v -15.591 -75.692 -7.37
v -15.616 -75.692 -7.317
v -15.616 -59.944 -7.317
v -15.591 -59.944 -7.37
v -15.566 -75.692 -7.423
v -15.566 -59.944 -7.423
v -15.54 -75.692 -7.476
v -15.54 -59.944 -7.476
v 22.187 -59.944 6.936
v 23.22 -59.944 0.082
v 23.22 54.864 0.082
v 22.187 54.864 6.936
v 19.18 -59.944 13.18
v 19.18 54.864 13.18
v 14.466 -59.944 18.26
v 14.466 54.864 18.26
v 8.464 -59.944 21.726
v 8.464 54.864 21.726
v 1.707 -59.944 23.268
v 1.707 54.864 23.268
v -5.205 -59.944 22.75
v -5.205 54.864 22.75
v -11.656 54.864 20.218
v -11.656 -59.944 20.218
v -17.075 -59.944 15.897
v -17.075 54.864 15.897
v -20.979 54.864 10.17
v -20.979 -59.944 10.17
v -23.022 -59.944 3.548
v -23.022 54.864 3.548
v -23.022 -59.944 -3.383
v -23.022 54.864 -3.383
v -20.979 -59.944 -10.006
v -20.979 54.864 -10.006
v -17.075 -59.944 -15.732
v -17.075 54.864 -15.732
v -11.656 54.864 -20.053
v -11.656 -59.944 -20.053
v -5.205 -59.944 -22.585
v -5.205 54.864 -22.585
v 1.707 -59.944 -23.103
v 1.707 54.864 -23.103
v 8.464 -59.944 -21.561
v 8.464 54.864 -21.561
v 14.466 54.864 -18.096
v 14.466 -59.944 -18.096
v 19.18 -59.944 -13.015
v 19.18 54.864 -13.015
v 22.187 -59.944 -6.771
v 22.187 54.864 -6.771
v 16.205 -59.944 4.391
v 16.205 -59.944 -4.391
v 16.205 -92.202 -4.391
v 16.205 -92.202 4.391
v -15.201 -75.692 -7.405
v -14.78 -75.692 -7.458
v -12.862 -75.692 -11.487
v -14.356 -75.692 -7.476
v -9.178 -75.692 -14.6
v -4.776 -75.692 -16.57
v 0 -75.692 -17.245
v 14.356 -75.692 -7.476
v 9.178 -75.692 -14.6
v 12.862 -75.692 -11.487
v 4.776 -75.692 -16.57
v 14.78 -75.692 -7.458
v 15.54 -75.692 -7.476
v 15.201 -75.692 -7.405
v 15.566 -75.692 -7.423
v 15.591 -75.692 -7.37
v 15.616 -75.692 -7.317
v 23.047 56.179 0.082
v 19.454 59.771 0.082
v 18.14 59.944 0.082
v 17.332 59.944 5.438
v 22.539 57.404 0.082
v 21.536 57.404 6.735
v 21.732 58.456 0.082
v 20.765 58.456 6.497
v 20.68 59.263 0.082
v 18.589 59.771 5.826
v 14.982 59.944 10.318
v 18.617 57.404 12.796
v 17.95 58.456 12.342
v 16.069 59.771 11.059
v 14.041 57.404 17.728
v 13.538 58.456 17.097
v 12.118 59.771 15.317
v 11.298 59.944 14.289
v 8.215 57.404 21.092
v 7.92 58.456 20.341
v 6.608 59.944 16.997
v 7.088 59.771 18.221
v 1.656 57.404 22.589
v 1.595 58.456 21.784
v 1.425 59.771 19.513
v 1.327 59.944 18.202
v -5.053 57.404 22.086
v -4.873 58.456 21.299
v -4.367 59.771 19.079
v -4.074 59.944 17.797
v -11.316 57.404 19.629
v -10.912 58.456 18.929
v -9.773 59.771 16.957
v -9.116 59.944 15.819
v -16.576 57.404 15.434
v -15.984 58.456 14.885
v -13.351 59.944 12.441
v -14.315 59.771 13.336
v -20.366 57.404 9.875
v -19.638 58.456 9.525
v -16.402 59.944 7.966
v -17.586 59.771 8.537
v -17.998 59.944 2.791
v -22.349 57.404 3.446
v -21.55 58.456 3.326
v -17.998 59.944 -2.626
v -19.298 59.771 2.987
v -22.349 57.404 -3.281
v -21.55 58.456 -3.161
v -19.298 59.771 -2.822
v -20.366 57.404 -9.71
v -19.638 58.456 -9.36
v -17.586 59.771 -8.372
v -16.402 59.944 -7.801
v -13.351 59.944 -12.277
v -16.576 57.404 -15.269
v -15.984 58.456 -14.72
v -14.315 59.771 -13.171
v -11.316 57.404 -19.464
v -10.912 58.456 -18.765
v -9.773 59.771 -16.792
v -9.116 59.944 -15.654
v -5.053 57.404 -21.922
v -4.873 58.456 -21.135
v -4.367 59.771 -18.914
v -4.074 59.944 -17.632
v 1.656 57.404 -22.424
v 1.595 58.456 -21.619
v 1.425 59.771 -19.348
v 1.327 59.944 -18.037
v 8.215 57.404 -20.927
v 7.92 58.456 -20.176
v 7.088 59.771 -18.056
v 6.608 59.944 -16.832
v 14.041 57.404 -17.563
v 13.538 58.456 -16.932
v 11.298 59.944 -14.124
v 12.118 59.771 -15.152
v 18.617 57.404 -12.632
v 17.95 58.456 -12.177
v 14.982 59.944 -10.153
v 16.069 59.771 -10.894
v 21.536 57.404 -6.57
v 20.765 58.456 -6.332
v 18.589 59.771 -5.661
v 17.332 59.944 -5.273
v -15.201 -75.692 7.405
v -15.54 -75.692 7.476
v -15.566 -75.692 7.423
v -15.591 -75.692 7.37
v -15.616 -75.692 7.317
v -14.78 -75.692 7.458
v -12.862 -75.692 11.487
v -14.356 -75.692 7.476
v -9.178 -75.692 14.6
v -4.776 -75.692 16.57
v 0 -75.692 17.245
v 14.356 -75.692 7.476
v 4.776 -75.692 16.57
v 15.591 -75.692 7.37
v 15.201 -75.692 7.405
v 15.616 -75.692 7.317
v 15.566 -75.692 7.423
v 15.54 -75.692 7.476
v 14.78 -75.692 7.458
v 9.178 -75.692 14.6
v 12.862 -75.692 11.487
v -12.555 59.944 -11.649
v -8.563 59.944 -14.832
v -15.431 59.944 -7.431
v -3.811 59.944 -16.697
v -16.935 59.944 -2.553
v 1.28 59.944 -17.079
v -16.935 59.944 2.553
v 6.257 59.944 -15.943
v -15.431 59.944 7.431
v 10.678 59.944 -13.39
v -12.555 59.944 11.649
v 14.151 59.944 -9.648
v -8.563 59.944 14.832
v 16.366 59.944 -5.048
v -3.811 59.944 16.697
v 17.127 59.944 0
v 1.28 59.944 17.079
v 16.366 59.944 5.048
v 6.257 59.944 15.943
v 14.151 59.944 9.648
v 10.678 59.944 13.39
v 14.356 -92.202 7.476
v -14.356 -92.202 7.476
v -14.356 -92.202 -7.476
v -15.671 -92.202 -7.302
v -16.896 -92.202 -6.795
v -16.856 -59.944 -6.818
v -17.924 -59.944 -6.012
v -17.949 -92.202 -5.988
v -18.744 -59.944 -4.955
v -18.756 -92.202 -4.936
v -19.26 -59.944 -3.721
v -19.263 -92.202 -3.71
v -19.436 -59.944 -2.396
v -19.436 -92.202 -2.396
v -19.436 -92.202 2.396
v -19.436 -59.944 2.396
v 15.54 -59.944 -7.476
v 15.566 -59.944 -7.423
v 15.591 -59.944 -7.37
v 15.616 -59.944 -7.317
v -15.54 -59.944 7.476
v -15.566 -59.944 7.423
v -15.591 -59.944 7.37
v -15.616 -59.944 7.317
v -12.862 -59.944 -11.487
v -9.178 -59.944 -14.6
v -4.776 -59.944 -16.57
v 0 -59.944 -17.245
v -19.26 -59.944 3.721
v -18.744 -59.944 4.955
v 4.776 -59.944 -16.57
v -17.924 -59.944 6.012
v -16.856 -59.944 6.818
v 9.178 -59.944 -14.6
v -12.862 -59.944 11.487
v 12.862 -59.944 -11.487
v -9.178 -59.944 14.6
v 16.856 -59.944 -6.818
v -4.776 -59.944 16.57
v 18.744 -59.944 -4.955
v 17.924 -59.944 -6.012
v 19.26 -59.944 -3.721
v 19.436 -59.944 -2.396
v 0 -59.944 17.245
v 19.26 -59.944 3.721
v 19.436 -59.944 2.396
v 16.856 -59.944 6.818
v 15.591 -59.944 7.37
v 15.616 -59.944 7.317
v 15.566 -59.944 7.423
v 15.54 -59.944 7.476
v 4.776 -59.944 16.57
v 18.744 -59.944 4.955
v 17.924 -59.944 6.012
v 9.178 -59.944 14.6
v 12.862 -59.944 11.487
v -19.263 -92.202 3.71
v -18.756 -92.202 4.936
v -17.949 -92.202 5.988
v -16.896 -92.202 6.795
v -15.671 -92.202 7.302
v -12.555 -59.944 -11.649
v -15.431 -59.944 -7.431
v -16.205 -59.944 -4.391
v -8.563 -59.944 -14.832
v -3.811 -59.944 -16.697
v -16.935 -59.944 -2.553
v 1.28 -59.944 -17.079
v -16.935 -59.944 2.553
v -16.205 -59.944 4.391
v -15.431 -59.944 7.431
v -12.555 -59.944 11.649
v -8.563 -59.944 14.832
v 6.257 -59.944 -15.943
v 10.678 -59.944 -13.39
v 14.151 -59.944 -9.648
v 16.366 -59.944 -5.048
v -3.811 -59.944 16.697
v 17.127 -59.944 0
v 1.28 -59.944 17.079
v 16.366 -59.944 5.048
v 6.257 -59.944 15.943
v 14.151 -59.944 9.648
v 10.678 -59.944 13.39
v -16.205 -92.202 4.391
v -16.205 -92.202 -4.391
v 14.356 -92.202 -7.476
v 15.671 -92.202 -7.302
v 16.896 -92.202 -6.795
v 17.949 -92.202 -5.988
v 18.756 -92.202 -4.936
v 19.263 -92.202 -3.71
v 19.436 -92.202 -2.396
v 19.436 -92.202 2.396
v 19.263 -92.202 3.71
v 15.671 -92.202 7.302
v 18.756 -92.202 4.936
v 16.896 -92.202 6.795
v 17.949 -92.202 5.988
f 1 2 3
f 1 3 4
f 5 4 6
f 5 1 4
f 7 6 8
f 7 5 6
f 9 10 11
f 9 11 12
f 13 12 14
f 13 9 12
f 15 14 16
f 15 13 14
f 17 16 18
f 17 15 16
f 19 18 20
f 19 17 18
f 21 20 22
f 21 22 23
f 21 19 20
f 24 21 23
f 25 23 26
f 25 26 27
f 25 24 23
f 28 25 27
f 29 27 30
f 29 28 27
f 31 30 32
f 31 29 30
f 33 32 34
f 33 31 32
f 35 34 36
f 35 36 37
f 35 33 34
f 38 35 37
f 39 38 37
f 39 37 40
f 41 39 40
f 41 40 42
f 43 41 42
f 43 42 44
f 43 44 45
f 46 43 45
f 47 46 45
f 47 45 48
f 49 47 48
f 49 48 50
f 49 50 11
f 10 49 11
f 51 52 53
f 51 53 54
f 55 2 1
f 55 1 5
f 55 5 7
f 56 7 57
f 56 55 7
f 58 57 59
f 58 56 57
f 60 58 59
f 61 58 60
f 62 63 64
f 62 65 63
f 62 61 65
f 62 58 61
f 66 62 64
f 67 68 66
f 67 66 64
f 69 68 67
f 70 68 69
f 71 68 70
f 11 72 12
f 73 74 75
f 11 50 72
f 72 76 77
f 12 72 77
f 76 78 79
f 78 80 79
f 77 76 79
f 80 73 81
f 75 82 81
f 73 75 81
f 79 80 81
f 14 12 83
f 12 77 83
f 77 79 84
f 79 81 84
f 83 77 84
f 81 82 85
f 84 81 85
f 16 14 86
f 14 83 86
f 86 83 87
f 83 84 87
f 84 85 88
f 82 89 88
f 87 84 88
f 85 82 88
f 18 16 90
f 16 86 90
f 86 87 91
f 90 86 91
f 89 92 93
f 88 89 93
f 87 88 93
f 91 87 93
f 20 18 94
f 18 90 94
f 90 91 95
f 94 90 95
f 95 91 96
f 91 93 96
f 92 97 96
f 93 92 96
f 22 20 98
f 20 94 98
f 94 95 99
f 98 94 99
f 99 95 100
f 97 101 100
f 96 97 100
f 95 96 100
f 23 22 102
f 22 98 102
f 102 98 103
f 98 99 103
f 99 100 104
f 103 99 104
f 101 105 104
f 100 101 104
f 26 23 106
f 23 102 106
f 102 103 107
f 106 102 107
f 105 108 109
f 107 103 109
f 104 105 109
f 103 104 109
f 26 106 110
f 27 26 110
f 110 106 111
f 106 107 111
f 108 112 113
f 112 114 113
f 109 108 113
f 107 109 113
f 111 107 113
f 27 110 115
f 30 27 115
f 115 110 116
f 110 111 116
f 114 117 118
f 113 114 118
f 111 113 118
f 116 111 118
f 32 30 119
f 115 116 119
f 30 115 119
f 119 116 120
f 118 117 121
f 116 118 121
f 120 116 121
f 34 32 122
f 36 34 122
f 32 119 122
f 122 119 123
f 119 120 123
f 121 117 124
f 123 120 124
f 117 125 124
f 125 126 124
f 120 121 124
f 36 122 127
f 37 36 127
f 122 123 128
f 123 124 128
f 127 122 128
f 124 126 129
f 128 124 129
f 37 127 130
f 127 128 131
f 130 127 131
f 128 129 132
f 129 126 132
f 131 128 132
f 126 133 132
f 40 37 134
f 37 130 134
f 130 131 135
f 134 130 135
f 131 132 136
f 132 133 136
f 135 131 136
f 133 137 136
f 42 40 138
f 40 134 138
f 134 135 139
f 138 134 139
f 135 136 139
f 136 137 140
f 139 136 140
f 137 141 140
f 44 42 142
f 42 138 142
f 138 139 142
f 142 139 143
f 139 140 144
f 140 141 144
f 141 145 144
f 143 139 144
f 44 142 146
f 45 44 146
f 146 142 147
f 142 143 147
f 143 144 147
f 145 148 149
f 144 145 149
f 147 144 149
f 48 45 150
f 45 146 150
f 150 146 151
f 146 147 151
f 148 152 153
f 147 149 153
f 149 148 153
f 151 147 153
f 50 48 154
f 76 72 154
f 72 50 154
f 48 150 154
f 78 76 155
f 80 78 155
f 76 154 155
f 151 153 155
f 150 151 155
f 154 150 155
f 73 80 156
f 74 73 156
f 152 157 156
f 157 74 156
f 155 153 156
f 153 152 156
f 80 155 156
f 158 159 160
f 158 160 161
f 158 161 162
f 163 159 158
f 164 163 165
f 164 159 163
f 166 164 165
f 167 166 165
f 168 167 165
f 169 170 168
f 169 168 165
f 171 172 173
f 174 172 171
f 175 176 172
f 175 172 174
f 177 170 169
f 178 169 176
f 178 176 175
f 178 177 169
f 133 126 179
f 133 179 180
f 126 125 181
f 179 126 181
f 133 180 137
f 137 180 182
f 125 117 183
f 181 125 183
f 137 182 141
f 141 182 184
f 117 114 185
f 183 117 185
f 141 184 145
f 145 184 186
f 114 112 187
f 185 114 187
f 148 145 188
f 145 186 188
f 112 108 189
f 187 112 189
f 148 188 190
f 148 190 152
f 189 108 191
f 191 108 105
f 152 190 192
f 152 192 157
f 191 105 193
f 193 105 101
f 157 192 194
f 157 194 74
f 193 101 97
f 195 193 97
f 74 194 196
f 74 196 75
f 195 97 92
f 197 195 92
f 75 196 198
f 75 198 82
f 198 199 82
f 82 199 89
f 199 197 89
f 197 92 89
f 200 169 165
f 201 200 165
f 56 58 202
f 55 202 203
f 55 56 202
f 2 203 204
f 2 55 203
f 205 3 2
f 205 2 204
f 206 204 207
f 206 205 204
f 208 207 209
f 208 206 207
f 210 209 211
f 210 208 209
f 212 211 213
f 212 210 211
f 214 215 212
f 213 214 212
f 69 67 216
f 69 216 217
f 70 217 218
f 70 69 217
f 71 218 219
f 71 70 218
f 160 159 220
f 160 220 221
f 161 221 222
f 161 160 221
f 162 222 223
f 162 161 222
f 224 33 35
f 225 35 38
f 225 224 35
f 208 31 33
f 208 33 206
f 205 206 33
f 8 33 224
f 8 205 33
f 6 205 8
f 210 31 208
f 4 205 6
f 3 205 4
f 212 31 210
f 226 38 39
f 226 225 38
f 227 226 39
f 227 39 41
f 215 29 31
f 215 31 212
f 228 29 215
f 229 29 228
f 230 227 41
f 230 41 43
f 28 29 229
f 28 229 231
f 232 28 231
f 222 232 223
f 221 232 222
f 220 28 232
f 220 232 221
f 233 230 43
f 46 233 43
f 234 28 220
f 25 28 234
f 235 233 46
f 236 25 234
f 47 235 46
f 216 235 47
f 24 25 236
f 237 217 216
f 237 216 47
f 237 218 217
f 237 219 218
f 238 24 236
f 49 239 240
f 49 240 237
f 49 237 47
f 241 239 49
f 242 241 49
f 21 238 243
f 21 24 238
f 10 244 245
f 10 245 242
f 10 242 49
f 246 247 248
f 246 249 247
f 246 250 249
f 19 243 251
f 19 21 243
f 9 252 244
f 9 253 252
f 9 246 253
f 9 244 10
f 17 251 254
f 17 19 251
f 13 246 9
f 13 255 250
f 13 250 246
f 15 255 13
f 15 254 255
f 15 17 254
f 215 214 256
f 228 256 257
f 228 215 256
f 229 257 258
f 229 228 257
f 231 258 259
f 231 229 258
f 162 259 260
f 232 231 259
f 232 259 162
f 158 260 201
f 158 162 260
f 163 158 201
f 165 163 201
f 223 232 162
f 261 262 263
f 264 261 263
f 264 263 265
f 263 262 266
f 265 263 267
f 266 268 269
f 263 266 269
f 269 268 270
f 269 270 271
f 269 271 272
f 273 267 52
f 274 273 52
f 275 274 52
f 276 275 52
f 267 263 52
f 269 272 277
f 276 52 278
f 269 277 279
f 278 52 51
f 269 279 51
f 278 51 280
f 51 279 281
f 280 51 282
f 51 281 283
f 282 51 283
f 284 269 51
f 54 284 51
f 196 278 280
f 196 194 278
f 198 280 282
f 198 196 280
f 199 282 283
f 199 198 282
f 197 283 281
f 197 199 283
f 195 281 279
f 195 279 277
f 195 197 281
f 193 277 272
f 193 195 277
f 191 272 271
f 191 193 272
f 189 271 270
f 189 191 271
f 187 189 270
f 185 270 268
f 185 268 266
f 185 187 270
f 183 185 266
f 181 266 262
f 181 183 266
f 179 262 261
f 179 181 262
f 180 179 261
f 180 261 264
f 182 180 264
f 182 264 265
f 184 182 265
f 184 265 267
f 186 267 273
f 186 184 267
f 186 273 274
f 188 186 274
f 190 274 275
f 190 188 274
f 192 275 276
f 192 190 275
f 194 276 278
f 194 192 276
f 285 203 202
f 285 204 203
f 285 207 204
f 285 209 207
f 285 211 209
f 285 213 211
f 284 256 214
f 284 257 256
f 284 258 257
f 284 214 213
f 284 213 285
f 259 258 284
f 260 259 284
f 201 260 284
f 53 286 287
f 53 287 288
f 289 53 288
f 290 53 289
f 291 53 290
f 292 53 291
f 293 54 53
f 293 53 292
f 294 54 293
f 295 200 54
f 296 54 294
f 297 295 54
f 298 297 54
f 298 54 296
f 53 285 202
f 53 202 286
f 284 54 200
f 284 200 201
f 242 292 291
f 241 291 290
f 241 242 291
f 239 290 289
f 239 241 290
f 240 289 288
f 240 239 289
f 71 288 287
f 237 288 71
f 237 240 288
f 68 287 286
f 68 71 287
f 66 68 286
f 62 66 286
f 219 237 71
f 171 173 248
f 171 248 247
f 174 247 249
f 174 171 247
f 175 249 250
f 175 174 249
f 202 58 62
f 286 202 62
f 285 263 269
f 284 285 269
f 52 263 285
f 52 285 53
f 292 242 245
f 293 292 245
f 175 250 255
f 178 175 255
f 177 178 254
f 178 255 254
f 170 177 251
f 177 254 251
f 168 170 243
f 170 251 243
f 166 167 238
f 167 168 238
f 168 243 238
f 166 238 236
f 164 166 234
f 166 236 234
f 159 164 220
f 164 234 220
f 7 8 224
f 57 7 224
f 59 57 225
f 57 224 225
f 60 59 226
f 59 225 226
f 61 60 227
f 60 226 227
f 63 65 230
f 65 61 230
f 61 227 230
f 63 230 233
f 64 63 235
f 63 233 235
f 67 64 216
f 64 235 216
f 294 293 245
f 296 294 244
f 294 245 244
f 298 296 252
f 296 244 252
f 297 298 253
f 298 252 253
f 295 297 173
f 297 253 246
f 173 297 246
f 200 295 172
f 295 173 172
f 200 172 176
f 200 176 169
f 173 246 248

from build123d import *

# Parameters (mm, degrees)
F0_R         = 23.2504682004
F0_R_2       = 17.1266274378
F1_DEPTH     = 59.944
F2_R         = 5.08
F4_W         = 32.4101708829
F4_H         = 8.7824892253
F5_DEPTH     = 32.258
F6_W         = 31.7728198101
F6_H         = 11.3427176839
F6_W_2       = 31.0806287388
F6_H_2       = 14.8886315292
F7_DEPTH     = 16.51
F8_T4_DEPTH  = 57.658
F8_T9_DEPTH  = 44.958
F8_S10_R     = 17.2448690912
F8_T11_DEPTH = 24
F8_T15_DEPTH = 44.958
F8_S16_R     = 17.2448690912
F8_T17_DEPTH = 24
F8_T21_DEPTH = 57.658
F8_T26_DEPTH = 44.958
F8_S27_R     = 17.2448690912
F8_T28_DEPTH = 24
F8_T32_DEPTH = 57.658
F8_T37_DEPTH = 44.958
F8_S38_R     = 17.2448690912
F8_T39_DEPTH = 24
F8_T43_DEPTH = 57.658


# Not quite as in the source:
# - a fillet or chamfer that OpenCascade refuses, or shapes differently, is made with other operations: its cross-section is extruded or revolved along the edge and cut away or added


with BuildPart() as f1:
    # F0 (on Front) → F1 (new body, symmetric)
    with BuildSketch(Plane.XZ):
        with Locations((-0.0308285998, 0.0824332965)):
            Circle(F0_R)
        Circle(F0_R_2, mode=Mode.SUBTRACT)
    extrude(amount=F1_DEPTH, both=True)

    # F2
    f2_edges = [f1.edges().sort_by_distance(p)[0] for p in [
        (-23.281297, 59.944, 0.082433),
    ]]
    fillet(f2_edges, radius=F2_R)

    # F4 (on face) → F5 (join)
    with BuildSketch(Plane.XZ.offset(59.944)):
        Polygon((-15.5403143694, 7.475569495), (-19.4364797935, 7.475569495), (-19.4364797935, -7.475569495), (-15.5403143694, -7.475569495), (15.5403143694, -7.475569495), (19.4364797935, -7.475569495), (19.4364797935, 7.475569495), (15.5403143694, 7.475569495), align=None)
        Rectangle(F4_W, F4_H, mode=Mode.SUBTRACT)
        with BuildLine():
            ThreePointArc((15.5403143694, 7.475569495), (0, 17.2448690912), (-15.5403143694, 7.475569495))
            Line((-15.5403143694, 7.475569495), (15.5403143694, 7.475569495))
        make_face()
        with BuildLine():
            Line((15.5403143694, -7.475569495), (-15.5403143694, -7.475569495))
            ThreePointArc((-15.5403143694, -7.475569495), (0, -17.2448690912), (15.5403143694, -7.475569495))
        make_face()
    extrude(amount=F5_DEPTH)

    # F6 (on face) → F7 (cut)
    with BuildSketch(Plane.XZ.offset(92.202)):
        with Locations((0.3460955357, 13.1469283369)):
            Rectangle(F6_W, F6_H)
        with Locations((0, -14.9198852596)):
            Rectangle(F6_W_2, F6_H_2)
    extrude(amount=-F7_DEPTH, mode=Mode.SUBTRACT)

    # F8: fillet of radius 5.08 on 4 edges, made by hand


with BuildPart() as f8_tool2:
    # F8_s3 → F8_t4 (new body)
    with BuildSketch(Plane.XZ.offset(47.244)):
        with BuildLine():
            ThreePointArc((-14.3564797935, -7.475569495), (-17.9485822419, -5.9876719434), (-19.4364797935, -2.395569495))
            Line((-19.4364797935, -2.395569495), (-19.4364797935, -7.475569495))
            Line((-19.4364797935, -7.475569495), (-14.3564797935, -7.475569495))
        make_face()
    extrude(amount=F8_T4_DEPTH)

    split(bisect_by=Plane.XZ.offset(75.692), keep=Keep.TOP)


with BuildPart() as f1_1:
    add(f1.part)

    # F8_t1: cut F8_tool2
    add(f8_tool2.part, mode=Mode.SUBTRACT)


with BuildPart() as f8_tool7:
    # F8_s8 → F8_t9 (new body)
    with BuildSketch(Plane.XZ.offset(59.944)):
        with BuildLine():
            ThreePointArc((-14.3564797935, -7.475569495), (-17.9485822419, -5.9876719434), (-19.4364797935, -2.395569495))
            Line((-19.4364797935, -2.395569495), (-19.4364797935, -7.475569495))
            Line((-19.4364797935, -7.475569495), (-14.3564797935, -7.475569495))
        make_face()
    extrude(amount=F8_T9_DEPTH)

    # F8_s10 → F8_t11 (cut, symmetric)
    with BuildSketch(Plane.XZ.offset(82.4)):
        Circle(F8_S10_R)
    extrude(amount=F8_T11_DEPTH, both=True, mode=Mode.SUBTRACT)


with BuildPart() as f1_2:
    add(f1_1.part)

    # F8_t6: cut F8_tool7
    add(f8_tool7.part, mode=Mode.SUBTRACT)


with BuildPart() as f8_tool13:
    # F8_s14 → F8_t15 (new body)
    with BuildSketch(Plane.XZ.offset(59.944)):
        with BuildLine():
            ThreePointArc((19.4364797935, -2.395569495), (17.9485822419, -5.9876719434), (14.3564797935, -7.475569495))
            Line((14.3564797935, -7.475569495), (19.4364797935, -7.475569495))
            Line((19.4364797935, -7.475569495), (19.4364797935, -2.395569495))
        make_face()
    extrude(amount=F8_T15_DEPTH)

    # F8_s16 → F8_t17 (cut, symmetric)
    with BuildSketch(Plane.XZ.offset(82.4)):
        Circle(F8_S16_R)
    extrude(amount=F8_T17_DEPTH, both=True, mode=Mode.SUBTRACT)


with BuildPart() as f1_3:
    add(f1_2.part)

    # F8_t12: cut F8_tool13
    add(f8_tool13.part, mode=Mode.SUBTRACT)


with BuildPart() as f8_tool19:
    # F8_s20 → F8_t21 (new body)
    with BuildSketch(Plane.XZ.offset(47.244)):
        with BuildLine():
            ThreePointArc((19.4364797935, -2.395569495), (17.9485822419, -5.9876719434), (14.3564797935, -7.475569495))
            Line((14.3564797935, -7.475569495), (19.4364797935, -7.475569495))
            Line((19.4364797935, -7.475569495), (19.4364797935, -2.395569495))
        make_face()
    extrude(amount=F8_T21_DEPTH)

    split(bisect_by=Plane.XZ.offset(75.692), keep=Keep.TOP)


with BuildPart() as f1_4:
    add(f1_3.part)

    # F8_t18: cut F8_tool19
    add(f8_tool19.part, mode=Mode.SUBTRACT)


with BuildPart() as f8_tool24:
    # F8_s25 → F8_t26 (new body)
    with BuildSketch(Plane.XZ.offset(59.944)):
        with BuildLine():
            ThreePointArc((19.4364797935, 2.395569495), (17.9485822419, 5.9876719434), (14.3564797935, 7.475569495))
            Line((14.3564797935, 7.475569495), (19.4364797935, 7.475569495))
            Line((19.4364797935, 7.475569495), (19.4364797935, 2.395569495))
        make_face()
    extrude(amount=F8_T26_DEPTH)

    # F8_s27 → F8_t28 (cut, symmetric)
    with BuildSketch(Plane.XZ.offset(82.4)):
        Circle(F8_S27_R)
    extrude(amount=F8_T28_DEPTH, both=True, mode=Mode.SUBTRACT)


with BuildPart() as f1_5:
    add(f1_4.part)

    # F8_t23: cut F8_tool24
    add(f8_tool24.part, mode=Mode.SUBTRACT)


with BuildPart() as f8_tool30:
    # F8_s31 → F8_t32 (new body)
    with BuildSketch(Plane.XZ.offset(47.244)):
        with BuildLine():
            ThreePointArc((19.4364797935, 2.395569495), (17.9485822419, 5.9876719434), (14.3564797935, 7.475569495))
            Line((14.3564797935, 7.475569495), (19.4364797935, 7.475569495))
            Line((19.4364797935, 7.475569495), (19.4364797935, 2.395569495))
        make_face()
    extrude(amount=F8_T32_DEPTH)

    split(bisect_by=Plane.XZ.offset(75.692), keep=Keep.TOP)


with BuildPart() as f1_6:
    add(f1_5.part)

    # F8_t29: cut F8_tool30
    add(f8_tool30.part, mode=Mode.SUBTRACT)


with BuildPart() as f8_tool35:
    # F8_s36 → F8_t37 (new body)
    with BuildSketch(Plane.XZ.offset(59.944)):
        with BuildLine():
            ThreePointArc((-19.4364797935, 2.395569495), (-17.9485822419, 5.9876719434), (-14.3564797935, 7.475569495))
            Line((-14.3564797935, 7.475569495), (-19.4364797935, 7.475569495))
            Line((-19.4364797935, 7.475569495), (-19.4364797935, 2.395569495))
        make_face()
    extrude(amount=F8_T37_DEPTH)

    # F8_s38 → F8_t39 (cut, symmetric)
    with BuildSketch(Plane.XZ.offset(82.4)):
        Circle(F8_S38_R)
    extrude(amount=F8_T39_DEPTH, both=True, mode=Mode.SUBTRACT)


with BuildPart() as f1_7:
    add(f1_6.part)

    # F8_t34: cut F8_tool35
    add(f8_tool35.part, mode=Mode.SUBTRACT)


with BuildPart() as f8_tool41:
    # F8_s42 → F8_t43 (new body)
    with BuildSketch(Plane.XZ.offset(47.244)):
        with BuildLine():
            ThreePointArc((-19.4364797935, 2.395569495), (-17.9485822419, 5.9876719434), (-14.3564797935, 7.475569495))
            Line((-14.3564797935, 7.475569495), (-19.4364797935, 7.475569495))
            Line((-19.4364797935, 7.475569495), (-19.4364797935, 2.395569495))
        make_face()
    extrude(amount=F8_T43_DEPTH)

    split(bisect_by=Plane.XZ.offset(75.692), keep=Keep.TOP)


with BuildPart() as f1_8:
    add(f1_7.part)

    # F8_t40: cut F8_tool41
    add(f8_tool41.part, mode=Mode.SUBTRACT)


solid = f1_8.part
